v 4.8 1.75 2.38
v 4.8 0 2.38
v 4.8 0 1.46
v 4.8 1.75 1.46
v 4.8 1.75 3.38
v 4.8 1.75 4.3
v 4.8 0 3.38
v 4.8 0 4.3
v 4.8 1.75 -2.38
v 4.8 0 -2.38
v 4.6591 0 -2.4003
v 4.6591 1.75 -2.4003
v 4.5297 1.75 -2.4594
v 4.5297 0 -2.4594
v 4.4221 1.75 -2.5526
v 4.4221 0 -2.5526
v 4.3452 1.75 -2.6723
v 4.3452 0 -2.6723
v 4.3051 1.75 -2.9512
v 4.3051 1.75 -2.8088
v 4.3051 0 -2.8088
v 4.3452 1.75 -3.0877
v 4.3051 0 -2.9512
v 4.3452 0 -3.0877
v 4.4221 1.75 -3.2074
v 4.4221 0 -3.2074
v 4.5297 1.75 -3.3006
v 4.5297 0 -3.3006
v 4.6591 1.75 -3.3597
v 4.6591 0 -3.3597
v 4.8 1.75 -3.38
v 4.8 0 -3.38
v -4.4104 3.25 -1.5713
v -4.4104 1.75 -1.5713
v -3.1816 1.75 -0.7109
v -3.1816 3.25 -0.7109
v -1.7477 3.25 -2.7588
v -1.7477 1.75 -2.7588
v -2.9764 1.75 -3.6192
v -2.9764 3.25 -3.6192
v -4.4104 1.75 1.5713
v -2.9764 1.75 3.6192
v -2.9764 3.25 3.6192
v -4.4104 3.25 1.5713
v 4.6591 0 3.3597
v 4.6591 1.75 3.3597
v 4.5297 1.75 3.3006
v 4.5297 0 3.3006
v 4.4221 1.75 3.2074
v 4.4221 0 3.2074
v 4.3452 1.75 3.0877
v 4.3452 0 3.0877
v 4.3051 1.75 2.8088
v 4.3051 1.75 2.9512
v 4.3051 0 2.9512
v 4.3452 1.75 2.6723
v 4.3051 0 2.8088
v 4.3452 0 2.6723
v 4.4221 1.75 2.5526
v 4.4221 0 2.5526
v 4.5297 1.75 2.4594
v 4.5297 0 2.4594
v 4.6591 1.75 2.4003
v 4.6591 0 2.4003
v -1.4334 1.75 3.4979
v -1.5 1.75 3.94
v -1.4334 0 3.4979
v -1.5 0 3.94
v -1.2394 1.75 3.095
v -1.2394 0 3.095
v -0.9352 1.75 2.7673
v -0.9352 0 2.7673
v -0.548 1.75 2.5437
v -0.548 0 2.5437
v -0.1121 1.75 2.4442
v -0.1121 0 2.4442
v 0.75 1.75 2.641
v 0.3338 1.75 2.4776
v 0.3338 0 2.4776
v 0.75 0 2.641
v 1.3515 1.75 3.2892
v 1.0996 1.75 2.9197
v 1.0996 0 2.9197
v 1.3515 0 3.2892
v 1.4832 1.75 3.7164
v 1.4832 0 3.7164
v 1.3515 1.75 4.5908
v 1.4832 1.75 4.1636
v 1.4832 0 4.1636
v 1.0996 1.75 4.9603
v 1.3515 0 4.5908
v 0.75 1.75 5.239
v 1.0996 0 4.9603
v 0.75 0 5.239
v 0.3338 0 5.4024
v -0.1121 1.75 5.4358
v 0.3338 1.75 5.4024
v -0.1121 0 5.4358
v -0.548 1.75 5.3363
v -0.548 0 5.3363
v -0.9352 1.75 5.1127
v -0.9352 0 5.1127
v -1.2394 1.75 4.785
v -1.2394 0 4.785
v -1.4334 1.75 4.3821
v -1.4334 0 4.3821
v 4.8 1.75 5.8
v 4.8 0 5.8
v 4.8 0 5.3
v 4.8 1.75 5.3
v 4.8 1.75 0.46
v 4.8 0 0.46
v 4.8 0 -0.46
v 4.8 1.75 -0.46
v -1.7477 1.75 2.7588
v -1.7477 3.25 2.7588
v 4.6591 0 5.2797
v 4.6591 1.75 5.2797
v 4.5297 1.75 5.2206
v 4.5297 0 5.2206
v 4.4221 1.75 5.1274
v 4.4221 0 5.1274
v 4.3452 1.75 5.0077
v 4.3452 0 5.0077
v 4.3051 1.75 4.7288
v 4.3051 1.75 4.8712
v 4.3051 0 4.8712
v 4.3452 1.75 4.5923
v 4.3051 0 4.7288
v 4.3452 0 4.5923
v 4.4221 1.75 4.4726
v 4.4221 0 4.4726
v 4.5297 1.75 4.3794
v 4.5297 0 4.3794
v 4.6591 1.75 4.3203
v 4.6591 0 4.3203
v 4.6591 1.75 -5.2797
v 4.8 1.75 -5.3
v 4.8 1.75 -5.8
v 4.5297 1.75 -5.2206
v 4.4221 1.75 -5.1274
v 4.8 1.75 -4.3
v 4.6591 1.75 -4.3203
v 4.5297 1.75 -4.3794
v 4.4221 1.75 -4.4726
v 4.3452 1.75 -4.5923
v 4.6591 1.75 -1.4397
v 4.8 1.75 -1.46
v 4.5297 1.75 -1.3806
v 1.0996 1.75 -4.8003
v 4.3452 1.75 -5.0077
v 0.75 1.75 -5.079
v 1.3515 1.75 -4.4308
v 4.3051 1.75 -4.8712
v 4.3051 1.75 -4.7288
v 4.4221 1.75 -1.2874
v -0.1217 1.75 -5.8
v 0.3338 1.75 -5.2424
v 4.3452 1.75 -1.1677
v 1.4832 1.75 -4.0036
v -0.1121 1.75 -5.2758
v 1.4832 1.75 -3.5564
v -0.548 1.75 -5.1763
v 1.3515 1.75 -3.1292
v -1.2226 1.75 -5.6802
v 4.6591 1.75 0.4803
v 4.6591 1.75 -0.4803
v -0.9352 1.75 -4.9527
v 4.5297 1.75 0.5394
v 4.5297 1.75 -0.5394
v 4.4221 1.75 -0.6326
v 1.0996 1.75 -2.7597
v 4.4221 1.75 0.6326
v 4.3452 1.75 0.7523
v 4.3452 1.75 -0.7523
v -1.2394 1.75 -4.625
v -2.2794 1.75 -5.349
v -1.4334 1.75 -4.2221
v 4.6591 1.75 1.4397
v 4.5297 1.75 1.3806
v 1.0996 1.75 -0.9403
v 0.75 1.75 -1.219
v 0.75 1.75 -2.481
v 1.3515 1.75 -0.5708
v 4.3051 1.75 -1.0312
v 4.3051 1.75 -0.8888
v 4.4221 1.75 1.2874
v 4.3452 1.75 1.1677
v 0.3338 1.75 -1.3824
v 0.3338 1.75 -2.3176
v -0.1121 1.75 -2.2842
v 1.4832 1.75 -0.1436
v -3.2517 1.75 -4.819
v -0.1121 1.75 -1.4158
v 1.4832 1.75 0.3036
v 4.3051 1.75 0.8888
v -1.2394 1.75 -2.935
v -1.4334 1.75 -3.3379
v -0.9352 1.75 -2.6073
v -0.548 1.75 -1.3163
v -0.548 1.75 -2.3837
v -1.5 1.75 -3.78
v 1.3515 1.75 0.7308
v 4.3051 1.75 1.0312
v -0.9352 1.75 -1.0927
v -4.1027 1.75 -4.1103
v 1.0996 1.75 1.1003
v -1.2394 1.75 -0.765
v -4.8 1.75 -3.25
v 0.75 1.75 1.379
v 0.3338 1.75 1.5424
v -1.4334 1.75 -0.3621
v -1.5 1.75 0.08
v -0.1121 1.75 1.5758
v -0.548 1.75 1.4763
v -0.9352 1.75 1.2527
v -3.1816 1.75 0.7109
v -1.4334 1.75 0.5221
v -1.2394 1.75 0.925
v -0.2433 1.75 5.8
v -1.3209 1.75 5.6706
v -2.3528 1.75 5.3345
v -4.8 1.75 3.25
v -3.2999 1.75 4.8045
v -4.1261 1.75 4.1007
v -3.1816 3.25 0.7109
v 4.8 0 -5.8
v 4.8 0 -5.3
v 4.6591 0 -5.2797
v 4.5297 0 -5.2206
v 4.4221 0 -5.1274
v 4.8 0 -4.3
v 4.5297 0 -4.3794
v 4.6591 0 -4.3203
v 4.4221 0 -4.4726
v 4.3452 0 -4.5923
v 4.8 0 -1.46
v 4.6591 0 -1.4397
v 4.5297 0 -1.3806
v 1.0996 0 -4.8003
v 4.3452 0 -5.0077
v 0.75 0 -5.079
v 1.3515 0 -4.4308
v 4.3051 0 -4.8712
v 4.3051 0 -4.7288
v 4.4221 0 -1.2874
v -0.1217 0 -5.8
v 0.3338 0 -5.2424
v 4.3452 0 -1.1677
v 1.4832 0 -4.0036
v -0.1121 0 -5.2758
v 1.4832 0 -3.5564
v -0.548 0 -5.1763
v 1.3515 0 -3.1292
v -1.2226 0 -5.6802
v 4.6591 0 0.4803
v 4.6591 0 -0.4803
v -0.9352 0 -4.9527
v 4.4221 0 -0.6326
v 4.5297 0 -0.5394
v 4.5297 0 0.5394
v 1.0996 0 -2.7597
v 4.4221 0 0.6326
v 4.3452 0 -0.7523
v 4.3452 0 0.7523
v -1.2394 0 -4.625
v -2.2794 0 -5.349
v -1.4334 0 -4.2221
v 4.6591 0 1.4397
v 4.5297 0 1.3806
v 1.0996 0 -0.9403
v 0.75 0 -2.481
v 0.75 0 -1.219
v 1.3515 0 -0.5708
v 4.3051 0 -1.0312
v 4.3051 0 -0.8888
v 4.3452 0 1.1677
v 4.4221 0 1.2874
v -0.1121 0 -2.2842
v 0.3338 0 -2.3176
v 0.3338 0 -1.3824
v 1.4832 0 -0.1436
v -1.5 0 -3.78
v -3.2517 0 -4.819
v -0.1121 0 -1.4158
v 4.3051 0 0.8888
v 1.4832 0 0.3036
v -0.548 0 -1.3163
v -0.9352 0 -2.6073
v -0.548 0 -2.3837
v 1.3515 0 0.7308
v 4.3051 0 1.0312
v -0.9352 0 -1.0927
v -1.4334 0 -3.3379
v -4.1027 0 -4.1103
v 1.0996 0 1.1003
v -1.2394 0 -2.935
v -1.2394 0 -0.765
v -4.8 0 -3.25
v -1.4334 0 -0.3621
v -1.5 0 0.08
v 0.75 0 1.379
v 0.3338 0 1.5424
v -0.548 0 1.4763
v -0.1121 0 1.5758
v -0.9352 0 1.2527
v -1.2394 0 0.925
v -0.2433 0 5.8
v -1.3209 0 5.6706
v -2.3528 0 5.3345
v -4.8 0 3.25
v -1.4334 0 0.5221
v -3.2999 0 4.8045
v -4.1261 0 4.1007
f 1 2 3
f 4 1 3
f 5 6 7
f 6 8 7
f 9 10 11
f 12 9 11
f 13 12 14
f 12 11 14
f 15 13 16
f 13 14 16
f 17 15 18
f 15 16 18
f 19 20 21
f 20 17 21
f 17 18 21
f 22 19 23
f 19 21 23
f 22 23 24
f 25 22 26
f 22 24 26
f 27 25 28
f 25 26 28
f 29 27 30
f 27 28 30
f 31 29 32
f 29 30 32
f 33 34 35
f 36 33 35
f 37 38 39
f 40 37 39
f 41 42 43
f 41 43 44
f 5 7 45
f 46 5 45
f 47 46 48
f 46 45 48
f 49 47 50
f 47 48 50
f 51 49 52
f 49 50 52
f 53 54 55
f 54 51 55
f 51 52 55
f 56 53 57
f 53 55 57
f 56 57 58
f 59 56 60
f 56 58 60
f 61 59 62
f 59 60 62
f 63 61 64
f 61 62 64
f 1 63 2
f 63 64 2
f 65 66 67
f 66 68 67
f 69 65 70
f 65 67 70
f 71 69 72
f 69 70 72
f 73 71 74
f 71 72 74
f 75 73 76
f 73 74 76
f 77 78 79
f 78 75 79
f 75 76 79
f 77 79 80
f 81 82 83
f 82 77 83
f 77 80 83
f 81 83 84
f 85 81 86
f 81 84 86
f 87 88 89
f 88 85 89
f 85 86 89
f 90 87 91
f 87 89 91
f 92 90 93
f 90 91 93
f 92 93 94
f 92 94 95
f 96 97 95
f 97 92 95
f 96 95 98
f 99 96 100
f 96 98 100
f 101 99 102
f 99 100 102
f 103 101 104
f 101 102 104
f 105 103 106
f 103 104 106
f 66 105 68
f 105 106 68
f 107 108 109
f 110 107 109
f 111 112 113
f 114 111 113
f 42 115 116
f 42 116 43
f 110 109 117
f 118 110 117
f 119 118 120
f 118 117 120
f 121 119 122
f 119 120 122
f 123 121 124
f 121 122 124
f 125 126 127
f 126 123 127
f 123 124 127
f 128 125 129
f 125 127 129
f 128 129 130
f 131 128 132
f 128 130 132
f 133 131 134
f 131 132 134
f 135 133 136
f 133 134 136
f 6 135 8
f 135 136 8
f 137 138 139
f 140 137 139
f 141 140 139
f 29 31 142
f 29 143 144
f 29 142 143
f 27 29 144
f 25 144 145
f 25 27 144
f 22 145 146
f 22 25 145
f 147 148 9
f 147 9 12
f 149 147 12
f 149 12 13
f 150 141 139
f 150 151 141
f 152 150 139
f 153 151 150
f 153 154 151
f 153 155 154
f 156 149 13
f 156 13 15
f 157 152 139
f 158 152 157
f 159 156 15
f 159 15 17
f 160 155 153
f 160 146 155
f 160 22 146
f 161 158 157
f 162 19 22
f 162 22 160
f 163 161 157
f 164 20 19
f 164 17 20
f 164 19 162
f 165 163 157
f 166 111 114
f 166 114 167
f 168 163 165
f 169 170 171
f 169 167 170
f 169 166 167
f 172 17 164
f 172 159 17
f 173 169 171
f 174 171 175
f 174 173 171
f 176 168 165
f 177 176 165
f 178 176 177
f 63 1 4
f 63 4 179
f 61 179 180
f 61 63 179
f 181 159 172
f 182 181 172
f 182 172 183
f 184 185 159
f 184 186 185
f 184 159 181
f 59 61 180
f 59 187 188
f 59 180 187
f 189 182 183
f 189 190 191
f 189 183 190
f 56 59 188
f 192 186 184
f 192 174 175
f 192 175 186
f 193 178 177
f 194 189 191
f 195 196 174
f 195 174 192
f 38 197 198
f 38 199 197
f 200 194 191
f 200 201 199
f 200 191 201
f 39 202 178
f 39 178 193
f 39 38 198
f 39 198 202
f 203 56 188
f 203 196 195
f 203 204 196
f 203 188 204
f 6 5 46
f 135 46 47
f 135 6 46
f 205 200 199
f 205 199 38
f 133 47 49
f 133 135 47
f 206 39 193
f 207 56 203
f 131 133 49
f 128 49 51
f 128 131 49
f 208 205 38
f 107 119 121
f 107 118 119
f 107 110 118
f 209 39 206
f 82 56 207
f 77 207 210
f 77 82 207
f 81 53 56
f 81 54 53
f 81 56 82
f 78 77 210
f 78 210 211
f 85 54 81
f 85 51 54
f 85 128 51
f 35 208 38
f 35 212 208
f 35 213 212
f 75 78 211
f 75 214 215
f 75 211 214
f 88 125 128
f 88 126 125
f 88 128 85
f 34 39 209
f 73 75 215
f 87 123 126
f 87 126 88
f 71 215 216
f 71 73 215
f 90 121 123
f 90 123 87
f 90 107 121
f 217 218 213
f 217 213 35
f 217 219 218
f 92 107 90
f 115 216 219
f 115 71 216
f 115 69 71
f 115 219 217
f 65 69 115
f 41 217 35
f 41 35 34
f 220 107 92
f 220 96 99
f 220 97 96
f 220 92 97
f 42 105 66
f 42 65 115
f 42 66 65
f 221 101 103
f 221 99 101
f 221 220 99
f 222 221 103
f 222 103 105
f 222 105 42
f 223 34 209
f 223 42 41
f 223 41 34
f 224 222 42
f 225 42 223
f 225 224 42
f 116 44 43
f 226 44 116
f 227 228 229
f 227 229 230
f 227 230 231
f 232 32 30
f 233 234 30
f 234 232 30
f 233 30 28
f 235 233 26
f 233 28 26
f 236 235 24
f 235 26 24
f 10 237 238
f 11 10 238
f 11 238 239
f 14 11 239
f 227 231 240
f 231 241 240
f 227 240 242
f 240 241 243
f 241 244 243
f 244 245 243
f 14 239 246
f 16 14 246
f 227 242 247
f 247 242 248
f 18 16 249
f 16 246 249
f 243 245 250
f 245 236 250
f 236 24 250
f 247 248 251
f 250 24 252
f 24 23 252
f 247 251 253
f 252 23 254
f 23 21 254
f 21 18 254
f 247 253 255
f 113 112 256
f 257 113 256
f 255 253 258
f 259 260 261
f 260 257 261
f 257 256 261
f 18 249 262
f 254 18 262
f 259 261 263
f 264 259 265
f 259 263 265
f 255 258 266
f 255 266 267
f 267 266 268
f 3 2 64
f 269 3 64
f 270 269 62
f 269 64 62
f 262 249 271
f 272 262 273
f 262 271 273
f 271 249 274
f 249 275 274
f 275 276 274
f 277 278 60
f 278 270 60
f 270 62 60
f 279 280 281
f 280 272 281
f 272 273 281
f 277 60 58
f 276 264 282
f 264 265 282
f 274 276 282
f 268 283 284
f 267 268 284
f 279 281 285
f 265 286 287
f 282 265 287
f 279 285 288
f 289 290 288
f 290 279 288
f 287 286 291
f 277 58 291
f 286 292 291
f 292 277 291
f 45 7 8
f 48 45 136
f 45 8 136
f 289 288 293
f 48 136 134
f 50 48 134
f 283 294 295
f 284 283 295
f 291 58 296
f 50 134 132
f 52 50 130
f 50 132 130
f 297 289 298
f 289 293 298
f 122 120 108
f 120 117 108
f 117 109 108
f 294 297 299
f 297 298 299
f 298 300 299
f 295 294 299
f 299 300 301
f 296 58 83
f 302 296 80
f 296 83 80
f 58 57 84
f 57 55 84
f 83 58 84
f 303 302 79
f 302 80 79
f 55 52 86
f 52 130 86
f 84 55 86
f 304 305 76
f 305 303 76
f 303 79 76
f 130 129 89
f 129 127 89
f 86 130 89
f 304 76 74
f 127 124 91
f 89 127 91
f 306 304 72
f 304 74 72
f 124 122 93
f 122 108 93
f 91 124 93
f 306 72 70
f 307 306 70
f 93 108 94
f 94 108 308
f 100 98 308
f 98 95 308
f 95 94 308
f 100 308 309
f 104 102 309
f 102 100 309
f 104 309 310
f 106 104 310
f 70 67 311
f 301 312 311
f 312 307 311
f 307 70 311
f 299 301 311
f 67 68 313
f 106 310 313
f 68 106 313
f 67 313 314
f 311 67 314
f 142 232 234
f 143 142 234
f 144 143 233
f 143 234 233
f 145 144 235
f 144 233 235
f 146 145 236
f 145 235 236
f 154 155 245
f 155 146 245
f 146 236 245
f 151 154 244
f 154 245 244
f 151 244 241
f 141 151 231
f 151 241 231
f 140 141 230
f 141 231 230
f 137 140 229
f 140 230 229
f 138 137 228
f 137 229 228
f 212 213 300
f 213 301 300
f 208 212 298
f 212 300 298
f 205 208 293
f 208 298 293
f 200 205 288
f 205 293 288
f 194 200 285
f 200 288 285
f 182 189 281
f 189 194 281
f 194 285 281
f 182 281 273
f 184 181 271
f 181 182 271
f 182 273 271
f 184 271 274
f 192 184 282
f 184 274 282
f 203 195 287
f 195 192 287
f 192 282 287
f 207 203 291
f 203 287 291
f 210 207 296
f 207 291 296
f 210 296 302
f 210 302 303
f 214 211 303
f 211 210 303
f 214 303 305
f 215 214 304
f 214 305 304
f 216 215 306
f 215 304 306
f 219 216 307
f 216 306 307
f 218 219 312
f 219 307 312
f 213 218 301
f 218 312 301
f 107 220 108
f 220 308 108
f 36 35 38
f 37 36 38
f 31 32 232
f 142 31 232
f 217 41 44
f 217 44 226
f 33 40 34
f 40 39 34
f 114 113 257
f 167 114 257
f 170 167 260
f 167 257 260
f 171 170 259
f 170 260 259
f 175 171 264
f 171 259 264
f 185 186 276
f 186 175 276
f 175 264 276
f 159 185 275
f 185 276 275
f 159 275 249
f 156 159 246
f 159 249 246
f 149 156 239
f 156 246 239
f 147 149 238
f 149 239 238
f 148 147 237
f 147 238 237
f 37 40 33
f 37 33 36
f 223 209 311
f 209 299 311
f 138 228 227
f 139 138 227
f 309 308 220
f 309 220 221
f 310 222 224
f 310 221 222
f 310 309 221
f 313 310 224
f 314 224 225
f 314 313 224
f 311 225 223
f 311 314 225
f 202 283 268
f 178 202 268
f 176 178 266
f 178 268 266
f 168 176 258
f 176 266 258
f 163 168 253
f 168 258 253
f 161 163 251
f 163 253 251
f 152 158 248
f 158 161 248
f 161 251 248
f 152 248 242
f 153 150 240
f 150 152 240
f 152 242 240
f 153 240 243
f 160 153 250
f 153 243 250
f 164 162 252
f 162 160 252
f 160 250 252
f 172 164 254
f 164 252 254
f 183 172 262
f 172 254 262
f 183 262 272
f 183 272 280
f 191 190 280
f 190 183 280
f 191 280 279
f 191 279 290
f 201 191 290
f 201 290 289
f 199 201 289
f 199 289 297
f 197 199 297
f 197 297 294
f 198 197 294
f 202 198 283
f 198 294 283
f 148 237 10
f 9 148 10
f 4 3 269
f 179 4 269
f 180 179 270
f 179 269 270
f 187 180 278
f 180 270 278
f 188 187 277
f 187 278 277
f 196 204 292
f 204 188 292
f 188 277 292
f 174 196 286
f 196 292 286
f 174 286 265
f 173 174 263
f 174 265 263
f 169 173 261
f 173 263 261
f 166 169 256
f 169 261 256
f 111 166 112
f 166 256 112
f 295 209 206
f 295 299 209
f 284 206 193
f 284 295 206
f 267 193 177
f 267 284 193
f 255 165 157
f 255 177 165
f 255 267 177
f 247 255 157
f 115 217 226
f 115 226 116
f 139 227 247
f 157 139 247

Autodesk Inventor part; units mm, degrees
ref_plane "YZ Plane" through (0, 0, 0) normal (1, 0, 0) x (0, 1, 0)
ref_plane "XZ Plane" through (0, 0, 0) normal (0, 1, 0) x (-1, 0, 0)
ref_plane "XY Plane" through (0, 0, 0) normal (0, 0, 1) x (1, 0, 0)
sketch "Sketch1" plane through (0, 0, 0) normal (0, 1, 0) x (-1, 0, 0)
  line L0 (-4.8, -5.8) -> (0.1217, -5.8)
  line L1 (4.8, -3.25) -> (4.8, 3.25)
  line L2 (0.2433, 5.8) -> (-4.8, 5.8)
  line L3 (-4.8, 5.8) -> (-4.8, -5.8)
  line L4 (-4.8, -5.8) -> (4.8, 5.8) construction
  line L5 (4.8, -5.8) -> (-4.8, 5.8) construction
  line L6 (4.8, 0) -> (4.8, 3.25) construction
  arc A0 (4.8, 3.25) -> (0, 5.8) centre (0.1217, 0.2363) ccw
  line L7 (4.8, 0) -> (4.8, -3.25) construction
  arc A1 (0, -5.8) -> (4.8, -3.25) centre (0.0608, -0.1218) ccw
  circle A2 centre (0, 3.94) radius 1.5
  circle A3 centre (0, 0.08) radius 1.5
  circle A4 centre (0, -3.78) radius 1.5
  arc A5 (-4.8, 4.3) -> (-4.8, 5.3) centre (-4.8, 4.8) ccw
  arc A6 (-4.8, 2.38) -> (-4.8, 3.38) centre (-4.8, 2.88) ccw
  arc A7 (-4.8, 0.46) -> (-4.8, 1.46) centre (-4.8, 0.96) ccw
  arc A8 (-4.8, -1.46) -> (-4.8, -0.46) centre (-4.8, -0.96) ccw
  arc A9 (-4.8, -3.38) -> (-4.8, -2.38) centre (-4.8, -2.88) ccw
  arc A10 (-4.8, -5.3) -> (-4.8, -4.3) centre (-4.8, -4.8) ccw
  line L8 (-4.8, 3.38) -> (-4.8, 2.38)
  line L9 (-4.8, 1.46) -> (-4.8, 0.46)
  line L10 (-4.8, -0.46) -> (-4.8, -1.46)
  line L11 (-4.8, -2.38) -> (-4.8, -3.38)
  line L12 (-4.8, -4.3) -> (-4.8, -5.3)
  point P0 (0, 0)
  dimension "d0" = 9.6
  dimension "d1" = 11.6
  dimension "d2" = 3.25
  dimension "d3" = 3.25
  dimension "d4" = 3
  dimension "d5" = 1.86
  dimension "d8" = 3.86
  dimension "d13" = 1
  dimension "d14" = 1
  dimension "d17" = 1.92
  dimension "d32" = 4.8
extrude "Extrusion2" add sketch "Sketch1" along normal blind 1.75 contours L3 A10 A9 A8 A7 A6 A5 L2 A0 L1 A1 L0
sketch "Sketch2" plane through (0, 1.75, 0) normal (0, 1, 0) x (1, 0, 0)
  line L0 (-1.7477, -2.7588) -> (-2.9764, -3.6192)
  line L1 (-2.9764, -3.6192) -> (-4.4104, -1.5713)
  line L2 (-4.4104, -1.5713) -> (-3.1816, -0.7109)
  line L3 (-3.1816, -0.7109) -> (-1.7477, -2.7588)
  line L4 (-4.55, -1.3) -> (-2.55, -4.3) construction
  line L5 (-2.55, -1.3) -> (-4.55, -4.3) construction
  line L6 (-0.2433, -5.8) -> (4.8, -5.8) projected
  line L7 (0, -5.8) -> (0, 5.8)
  line L8 (4.8, 5.8) -> (-0.1217, 5.8) projected
  line L9 (-4.8, 3.25) -> (-4.8, -3.25) projected
  line L10 (-4.8, 0) -> (4.8, 0) construction
  line L11 (-1.7477, 2.7588) -> (-2.9764, 3.6192)
  line L12 (-2.9764, 3.6192) -> (-4.4104, 1.5713)
  line L13 (-4.4104, 1.5713) -> (-3.1816, 0.7109)
  line L14 (-3.1816, 0.7109) -> (-1.7477, 2.7588)
  point P0 (0, 0)
  point P1 (-3.55, -2.8)
  point P2 (-3.55, -2.8)
  dimension "d26" = 1.5
  dimension "d27" = 2.5
  dimension "d28" = 1.25
  dimension "d29" = 3
extrude "Extrusion3" add sketch "Sketch2" along normal blind 1.5
properties part number "Encoder_optico"
